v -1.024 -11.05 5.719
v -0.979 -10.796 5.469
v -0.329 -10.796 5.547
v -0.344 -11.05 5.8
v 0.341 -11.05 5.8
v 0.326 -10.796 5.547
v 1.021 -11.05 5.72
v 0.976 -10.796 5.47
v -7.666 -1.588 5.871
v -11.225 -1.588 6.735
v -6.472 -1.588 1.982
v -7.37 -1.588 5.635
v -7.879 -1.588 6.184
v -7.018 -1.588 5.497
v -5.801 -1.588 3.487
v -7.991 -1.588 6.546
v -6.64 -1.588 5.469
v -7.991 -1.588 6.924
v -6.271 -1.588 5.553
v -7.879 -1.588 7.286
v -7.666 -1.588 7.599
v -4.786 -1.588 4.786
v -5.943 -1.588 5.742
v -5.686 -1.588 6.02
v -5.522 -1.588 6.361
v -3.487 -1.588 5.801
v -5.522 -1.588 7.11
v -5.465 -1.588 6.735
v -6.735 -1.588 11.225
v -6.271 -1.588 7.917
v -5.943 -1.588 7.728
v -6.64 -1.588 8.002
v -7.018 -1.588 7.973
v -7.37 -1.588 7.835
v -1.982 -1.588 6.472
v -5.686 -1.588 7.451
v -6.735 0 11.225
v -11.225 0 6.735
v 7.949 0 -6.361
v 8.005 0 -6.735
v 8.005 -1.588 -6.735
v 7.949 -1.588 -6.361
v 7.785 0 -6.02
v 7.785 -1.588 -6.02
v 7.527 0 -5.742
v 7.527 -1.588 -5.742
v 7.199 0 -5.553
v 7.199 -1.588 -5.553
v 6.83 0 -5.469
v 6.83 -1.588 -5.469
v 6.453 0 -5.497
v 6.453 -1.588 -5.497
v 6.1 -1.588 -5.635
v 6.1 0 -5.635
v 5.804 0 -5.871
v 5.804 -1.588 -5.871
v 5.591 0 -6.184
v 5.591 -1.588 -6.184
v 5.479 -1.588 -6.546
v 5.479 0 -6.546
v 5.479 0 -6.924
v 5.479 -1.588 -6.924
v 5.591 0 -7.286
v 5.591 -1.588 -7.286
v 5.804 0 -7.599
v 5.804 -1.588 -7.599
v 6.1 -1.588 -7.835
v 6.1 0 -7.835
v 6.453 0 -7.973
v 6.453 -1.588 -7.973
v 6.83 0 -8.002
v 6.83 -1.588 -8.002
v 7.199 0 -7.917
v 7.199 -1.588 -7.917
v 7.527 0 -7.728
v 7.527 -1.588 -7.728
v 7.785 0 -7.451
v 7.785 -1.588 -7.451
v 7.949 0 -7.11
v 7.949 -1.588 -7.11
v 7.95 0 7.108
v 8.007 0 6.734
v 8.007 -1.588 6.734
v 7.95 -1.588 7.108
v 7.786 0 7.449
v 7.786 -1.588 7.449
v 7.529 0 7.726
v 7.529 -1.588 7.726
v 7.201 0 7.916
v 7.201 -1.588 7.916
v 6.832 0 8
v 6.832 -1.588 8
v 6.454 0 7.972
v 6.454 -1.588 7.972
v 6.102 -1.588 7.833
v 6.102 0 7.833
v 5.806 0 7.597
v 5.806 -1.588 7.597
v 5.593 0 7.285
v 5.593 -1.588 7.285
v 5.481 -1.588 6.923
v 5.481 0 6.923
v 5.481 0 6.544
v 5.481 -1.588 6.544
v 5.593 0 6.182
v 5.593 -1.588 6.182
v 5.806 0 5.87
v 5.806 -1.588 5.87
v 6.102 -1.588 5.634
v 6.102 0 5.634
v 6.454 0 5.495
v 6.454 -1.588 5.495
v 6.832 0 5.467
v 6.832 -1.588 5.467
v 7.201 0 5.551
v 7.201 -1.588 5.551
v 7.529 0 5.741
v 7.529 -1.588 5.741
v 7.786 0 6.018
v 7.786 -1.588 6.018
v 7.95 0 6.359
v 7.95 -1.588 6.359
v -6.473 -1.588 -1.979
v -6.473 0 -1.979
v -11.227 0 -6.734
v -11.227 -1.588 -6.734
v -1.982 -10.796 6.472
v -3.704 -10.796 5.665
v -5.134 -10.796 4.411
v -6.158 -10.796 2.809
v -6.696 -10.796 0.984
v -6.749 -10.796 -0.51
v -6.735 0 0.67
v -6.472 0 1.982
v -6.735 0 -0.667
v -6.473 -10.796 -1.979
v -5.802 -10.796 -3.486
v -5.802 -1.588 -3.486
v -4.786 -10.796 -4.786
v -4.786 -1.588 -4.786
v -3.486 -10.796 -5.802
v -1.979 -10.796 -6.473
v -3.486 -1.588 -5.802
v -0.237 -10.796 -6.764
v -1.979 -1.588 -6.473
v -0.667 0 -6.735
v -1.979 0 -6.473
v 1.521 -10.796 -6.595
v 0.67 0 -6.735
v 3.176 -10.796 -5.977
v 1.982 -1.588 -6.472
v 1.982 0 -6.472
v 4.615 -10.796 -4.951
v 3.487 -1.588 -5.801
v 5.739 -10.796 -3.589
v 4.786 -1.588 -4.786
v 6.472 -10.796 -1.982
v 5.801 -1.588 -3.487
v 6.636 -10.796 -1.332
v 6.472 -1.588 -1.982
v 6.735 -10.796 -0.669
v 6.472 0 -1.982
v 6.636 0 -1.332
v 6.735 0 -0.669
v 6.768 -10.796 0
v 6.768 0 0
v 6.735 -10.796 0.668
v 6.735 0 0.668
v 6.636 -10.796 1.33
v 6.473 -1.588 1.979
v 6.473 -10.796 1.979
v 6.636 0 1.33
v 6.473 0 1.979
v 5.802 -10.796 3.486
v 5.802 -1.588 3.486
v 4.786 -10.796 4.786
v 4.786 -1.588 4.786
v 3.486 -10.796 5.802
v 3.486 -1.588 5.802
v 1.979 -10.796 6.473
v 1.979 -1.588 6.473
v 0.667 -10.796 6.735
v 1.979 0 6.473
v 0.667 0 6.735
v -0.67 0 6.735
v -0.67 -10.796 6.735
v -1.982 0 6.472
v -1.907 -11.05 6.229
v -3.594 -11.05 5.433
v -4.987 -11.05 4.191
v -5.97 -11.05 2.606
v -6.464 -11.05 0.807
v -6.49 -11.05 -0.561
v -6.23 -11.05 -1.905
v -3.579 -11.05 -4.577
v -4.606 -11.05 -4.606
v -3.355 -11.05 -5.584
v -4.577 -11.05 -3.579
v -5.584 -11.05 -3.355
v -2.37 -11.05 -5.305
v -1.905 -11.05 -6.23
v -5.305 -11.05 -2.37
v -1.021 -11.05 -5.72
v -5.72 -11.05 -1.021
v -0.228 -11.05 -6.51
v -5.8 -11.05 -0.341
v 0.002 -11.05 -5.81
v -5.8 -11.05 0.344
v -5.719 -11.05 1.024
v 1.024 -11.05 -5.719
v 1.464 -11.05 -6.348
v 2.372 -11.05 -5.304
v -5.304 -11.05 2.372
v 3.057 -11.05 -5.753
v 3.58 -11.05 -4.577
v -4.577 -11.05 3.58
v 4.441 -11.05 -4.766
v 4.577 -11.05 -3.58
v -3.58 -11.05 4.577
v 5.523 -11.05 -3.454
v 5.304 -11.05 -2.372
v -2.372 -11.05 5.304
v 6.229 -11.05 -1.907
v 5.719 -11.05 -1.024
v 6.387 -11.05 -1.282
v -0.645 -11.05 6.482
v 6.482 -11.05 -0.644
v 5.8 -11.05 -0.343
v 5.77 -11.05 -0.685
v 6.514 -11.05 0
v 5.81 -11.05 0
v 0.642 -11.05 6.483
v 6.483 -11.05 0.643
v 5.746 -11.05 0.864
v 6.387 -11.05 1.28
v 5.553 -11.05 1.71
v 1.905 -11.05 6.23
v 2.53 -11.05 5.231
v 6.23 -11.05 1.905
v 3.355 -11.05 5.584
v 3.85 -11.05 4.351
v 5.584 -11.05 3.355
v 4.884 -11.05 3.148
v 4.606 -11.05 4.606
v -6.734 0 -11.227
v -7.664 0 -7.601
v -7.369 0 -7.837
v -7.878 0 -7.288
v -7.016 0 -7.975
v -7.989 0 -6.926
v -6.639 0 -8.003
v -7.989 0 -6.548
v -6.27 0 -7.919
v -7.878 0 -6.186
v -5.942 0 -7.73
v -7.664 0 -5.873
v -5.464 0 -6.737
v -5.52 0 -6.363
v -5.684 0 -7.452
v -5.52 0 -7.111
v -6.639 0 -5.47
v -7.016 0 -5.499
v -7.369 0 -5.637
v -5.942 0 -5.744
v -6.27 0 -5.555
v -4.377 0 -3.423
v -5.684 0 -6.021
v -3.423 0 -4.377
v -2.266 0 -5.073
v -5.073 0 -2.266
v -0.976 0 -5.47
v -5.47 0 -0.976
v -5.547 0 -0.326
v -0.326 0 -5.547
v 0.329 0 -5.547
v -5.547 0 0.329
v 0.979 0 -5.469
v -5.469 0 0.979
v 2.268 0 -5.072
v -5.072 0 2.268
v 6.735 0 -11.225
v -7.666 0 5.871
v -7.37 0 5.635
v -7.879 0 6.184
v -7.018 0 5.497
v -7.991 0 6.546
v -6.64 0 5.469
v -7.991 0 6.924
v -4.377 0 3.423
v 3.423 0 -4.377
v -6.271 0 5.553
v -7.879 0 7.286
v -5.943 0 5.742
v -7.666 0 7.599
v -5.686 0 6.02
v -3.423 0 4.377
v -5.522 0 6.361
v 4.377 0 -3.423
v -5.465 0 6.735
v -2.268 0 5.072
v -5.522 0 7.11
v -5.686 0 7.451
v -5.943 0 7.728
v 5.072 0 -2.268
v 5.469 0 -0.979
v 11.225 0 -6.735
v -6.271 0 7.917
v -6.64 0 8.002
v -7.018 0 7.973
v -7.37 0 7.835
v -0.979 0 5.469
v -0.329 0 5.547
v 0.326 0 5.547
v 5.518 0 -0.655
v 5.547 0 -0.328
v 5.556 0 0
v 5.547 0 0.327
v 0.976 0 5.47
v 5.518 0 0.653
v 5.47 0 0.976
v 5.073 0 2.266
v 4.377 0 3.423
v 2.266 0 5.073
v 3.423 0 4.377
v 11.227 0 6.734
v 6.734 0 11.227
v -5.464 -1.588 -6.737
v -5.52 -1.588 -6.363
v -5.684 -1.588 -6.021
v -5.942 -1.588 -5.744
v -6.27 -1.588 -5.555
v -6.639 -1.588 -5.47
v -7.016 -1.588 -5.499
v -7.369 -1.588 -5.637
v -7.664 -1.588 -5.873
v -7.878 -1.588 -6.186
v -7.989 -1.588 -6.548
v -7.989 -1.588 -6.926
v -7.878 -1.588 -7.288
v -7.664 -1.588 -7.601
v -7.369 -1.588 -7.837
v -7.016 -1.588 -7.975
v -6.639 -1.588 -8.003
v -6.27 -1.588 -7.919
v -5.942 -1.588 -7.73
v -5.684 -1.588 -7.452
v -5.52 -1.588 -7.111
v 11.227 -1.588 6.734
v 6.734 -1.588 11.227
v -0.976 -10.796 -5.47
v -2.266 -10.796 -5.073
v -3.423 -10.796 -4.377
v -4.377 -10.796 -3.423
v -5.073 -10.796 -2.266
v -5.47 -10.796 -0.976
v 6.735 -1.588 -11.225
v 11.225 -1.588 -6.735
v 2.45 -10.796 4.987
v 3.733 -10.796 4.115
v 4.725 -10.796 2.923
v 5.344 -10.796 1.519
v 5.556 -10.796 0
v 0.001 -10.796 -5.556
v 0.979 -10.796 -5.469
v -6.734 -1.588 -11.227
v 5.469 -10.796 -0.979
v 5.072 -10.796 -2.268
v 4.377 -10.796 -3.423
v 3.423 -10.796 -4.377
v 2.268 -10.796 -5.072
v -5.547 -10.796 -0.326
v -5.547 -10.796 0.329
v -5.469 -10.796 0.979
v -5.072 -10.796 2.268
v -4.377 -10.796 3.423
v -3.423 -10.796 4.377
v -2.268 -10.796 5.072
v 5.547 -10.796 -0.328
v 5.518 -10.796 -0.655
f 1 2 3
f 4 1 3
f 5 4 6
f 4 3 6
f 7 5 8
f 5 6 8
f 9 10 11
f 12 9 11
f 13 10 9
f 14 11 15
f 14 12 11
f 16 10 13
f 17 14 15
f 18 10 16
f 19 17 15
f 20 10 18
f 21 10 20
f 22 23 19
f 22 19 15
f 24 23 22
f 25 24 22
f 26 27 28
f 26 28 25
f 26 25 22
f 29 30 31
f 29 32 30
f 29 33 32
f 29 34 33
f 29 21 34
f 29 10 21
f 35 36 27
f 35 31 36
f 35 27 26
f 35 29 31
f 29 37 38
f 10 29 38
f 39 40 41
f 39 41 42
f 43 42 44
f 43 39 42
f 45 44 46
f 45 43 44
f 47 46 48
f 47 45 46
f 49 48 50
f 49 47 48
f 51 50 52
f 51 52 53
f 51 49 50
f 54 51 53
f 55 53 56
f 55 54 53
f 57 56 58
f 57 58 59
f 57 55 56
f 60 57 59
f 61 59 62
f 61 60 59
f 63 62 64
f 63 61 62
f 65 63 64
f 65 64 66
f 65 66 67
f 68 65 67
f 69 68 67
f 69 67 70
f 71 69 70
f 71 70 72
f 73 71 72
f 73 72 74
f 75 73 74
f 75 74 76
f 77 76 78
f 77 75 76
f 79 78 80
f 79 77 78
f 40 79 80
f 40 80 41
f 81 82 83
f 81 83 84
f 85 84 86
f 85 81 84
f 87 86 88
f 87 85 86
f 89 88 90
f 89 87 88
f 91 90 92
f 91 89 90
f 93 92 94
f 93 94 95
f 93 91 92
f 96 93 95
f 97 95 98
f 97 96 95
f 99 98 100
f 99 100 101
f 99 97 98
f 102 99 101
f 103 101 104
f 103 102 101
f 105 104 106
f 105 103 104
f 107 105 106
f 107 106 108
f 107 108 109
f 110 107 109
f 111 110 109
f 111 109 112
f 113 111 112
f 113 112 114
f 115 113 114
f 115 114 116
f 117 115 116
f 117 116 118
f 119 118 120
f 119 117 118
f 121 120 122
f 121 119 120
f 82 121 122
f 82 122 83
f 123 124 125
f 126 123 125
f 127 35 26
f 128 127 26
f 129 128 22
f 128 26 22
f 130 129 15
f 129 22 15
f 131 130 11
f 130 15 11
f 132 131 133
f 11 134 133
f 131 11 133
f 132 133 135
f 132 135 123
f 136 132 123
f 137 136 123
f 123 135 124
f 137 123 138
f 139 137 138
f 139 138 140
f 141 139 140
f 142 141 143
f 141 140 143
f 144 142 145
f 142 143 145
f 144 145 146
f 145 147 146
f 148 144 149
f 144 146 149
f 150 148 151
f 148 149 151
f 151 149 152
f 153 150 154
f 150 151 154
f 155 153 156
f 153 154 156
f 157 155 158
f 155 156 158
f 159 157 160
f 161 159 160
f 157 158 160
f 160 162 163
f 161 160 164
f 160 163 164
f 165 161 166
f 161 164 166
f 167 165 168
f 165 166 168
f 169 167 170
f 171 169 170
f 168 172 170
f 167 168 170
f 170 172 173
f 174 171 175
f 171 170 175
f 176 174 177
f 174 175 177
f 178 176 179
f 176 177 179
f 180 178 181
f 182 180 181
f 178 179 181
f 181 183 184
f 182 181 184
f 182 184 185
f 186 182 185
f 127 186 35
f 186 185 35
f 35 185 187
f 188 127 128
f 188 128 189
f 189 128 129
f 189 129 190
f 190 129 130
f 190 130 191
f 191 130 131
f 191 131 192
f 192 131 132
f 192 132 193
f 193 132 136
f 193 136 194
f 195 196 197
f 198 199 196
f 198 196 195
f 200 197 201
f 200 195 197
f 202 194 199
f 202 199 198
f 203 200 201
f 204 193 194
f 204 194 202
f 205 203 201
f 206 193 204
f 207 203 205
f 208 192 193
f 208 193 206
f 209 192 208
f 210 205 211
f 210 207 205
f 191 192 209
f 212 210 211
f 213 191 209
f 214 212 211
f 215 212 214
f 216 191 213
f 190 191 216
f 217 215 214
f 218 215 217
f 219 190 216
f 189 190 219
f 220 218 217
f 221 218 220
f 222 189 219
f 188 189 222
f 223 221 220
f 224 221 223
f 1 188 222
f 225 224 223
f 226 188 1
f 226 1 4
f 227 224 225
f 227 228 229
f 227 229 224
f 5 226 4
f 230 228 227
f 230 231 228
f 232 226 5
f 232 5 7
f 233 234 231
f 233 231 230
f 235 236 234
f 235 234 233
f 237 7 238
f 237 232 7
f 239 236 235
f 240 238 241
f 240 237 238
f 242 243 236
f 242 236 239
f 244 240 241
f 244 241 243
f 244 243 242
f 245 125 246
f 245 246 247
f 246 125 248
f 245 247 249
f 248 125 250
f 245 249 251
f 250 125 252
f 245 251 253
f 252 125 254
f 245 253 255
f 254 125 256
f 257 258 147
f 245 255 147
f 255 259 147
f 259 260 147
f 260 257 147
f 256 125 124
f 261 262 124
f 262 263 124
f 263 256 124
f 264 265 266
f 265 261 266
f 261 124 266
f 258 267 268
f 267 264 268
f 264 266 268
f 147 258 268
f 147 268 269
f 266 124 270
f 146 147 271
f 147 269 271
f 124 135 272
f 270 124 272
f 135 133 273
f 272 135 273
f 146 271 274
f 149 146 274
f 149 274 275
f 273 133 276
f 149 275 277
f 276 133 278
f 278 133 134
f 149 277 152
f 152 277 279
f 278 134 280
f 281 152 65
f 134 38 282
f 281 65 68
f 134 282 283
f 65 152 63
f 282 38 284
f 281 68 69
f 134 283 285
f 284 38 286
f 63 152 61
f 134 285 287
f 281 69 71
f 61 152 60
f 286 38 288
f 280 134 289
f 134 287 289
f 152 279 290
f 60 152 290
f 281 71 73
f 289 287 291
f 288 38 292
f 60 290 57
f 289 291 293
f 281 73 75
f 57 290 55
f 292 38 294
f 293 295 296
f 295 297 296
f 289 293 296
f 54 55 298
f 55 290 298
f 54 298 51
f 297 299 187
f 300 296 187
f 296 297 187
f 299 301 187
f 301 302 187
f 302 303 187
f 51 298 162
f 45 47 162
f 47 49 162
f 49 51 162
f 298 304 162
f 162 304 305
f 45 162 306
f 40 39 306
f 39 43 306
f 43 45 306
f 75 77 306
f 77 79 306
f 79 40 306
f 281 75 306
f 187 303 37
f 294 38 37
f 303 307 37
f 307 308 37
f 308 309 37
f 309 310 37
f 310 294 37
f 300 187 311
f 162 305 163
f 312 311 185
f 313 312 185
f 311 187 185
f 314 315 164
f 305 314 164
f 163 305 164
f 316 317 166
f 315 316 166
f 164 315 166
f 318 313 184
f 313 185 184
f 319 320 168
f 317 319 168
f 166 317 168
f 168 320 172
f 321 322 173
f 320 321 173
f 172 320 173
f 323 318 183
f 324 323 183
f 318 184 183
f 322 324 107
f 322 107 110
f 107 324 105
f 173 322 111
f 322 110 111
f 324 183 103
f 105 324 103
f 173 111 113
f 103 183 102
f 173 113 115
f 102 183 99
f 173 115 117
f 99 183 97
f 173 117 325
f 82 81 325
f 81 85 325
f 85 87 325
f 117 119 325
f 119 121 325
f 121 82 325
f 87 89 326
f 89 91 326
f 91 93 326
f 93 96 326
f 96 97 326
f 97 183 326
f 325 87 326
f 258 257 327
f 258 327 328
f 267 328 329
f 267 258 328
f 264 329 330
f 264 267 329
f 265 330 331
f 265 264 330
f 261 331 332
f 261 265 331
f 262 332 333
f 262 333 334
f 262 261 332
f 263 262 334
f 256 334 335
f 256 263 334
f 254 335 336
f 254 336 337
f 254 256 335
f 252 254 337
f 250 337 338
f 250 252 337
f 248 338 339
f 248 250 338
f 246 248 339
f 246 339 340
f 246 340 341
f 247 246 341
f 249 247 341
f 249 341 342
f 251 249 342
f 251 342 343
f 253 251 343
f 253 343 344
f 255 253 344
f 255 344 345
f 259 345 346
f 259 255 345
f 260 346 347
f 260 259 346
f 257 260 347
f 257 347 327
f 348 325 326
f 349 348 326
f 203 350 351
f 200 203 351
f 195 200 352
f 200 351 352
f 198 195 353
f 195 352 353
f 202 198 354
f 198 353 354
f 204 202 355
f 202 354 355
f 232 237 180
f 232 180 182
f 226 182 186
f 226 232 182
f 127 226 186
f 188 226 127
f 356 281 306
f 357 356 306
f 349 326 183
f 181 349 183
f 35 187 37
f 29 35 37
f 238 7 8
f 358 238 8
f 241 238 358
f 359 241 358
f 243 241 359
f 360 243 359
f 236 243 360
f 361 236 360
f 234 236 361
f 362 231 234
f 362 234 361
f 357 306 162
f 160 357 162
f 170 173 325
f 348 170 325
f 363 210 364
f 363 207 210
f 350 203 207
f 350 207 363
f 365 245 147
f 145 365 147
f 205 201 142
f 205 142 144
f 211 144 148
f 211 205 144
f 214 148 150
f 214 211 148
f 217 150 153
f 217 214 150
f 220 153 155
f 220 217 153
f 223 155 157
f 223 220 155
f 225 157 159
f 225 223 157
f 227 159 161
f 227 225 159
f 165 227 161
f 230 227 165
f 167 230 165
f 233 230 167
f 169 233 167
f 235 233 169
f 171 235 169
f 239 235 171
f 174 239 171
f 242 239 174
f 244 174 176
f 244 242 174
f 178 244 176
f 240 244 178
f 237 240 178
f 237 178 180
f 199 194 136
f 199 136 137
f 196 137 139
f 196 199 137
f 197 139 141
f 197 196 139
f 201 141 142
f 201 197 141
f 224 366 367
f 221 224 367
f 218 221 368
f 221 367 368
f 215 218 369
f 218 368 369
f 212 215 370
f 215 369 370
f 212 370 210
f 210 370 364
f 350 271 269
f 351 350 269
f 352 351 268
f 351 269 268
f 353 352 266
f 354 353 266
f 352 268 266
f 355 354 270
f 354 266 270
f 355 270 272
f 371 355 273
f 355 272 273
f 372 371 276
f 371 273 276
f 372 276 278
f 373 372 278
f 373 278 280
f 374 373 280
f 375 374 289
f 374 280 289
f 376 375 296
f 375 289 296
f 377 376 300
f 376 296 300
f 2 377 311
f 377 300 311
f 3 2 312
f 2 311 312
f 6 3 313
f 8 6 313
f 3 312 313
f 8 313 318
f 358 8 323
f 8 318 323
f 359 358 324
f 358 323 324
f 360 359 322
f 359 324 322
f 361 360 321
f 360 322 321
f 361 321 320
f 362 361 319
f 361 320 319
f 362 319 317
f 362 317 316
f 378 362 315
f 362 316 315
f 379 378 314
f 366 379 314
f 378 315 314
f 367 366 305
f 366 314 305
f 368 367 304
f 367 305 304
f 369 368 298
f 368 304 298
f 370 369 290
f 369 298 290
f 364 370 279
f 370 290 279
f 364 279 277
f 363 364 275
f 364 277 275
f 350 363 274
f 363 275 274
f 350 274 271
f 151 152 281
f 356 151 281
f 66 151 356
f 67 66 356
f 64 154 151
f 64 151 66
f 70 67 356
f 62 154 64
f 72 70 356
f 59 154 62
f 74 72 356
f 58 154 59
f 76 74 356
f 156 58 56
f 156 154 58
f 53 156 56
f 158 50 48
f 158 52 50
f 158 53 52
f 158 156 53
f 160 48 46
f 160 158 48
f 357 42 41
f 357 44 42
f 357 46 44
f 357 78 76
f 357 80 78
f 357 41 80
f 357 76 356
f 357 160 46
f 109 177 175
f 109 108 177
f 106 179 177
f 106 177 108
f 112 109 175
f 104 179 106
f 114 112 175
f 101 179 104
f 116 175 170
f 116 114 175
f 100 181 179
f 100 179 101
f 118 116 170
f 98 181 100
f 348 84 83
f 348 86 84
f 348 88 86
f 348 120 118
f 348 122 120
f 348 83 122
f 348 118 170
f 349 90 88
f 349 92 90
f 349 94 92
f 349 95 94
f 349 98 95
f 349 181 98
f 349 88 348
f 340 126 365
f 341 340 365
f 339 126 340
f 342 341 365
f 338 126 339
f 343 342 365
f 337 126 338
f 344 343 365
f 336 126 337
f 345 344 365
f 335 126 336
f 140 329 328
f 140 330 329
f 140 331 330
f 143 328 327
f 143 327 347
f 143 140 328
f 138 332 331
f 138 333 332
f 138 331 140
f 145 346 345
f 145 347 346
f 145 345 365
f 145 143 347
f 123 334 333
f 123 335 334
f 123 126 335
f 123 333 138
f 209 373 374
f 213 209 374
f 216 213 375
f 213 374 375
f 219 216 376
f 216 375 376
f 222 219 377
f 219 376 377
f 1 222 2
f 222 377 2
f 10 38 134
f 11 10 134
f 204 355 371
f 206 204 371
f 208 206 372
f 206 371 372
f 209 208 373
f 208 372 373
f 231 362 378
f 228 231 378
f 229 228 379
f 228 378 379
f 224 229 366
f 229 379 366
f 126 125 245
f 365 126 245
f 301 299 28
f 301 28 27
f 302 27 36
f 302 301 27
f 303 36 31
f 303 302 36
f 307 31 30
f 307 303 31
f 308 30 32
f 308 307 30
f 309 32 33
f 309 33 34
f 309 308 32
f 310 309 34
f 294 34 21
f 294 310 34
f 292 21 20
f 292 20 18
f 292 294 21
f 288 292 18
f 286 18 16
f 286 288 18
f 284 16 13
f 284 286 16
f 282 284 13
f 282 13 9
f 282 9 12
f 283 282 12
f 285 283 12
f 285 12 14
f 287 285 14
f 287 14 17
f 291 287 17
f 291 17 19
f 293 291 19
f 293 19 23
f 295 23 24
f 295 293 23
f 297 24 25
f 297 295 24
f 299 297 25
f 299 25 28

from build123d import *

# Parameters (mm, degrees)
F0_R     = 1.27
F1_DEPTH = 1.5875
F2_DEPTH = 11.0500585288
F3_SIZE  = 0.254


with BuildPart() as f1:
    # F0 (on Front) → F1 (new body)
    with BuildSketch(Plane.XZ):
        with BuildLine():
            Line((-6.7335235308, -11.2269887114), (-1.9790852934, -6.4725504739))
            ThreePointArc((-1.9790852934, -6.4725504739), (-4.785952791, -4.785952791), (-6.4725504739, -1.9790852934))
            Line((-6.4725504739, -1.9790852934), (-11.2269887114, -6.7335235308))
            Line((-11.2269887114, -6.7335235308), (-6.7335235308, -11.2269887114))
        make_face()
        with Locations((-6.7335235308, -6.7368606508)):
            Circle(F0_R, mode=Mode.SUBTRACT)
        with BuildLine():
            Line((6.7351920908, -11.2253201513), (11.2253201513, -6.7351920908))
            Line((11.2253201513, -6.7351920908), (6.4717686116, -1.9816405511))
            ThreePointArc((6.4717686116, -1.9816405511), (4.785952791, -4.785952791), (1.9816405511, -6.4717686116))
            Line((1.9816405511, -6.4717686116), (6.7351920908, -11.2253201513))
        make_face()
        with Locations((6.7351920908, -6.7351920908)):
            Circle(F0_R, mode=Mode.SUBTRACT)
        with BuildLine():
            Line((-11.2253201513, 6.7351920908), (-6.4717686116, 1.9816405511))
            ThreePointArc((-6.4717686116, 1.9816405511), (-4.785952791, 4.785952791), (-1.9816405511, 6.4717686116))
            Line((-1.9816405511, 6.4717686116), (-6.7351920908, 11.2253201513))
            Line((-6.7351920908, 11.2253201513), (-11.2253201513, 6.7351920908))
        make_face()
        with Locations((-6.7351920908, 6.7351920908)):
            Circle(F0_R, mode=Mode.SUBTRACT)
        with BuildLine():
            ThreePointArc((1.9790852934, 6.4725504739), (4.785952791, 4.785952791), (6.4725504739, 1.9790852934))
            Line((6.4725504739, 1.9790852934), (11.2269887114, 6.7335235308))
            Line((11.2269887114, 6.7335235308), (6.7335235308, 11.2269887114))
            Line((6.7335235308, 11.2269887114), (1.9790852934, 6.4725504739))
        make_face()
        with Locations((6.7368606508, 6.7335235308)):
            Circle(F0_R, mode=Mode.SUBTRACT)
        with BuildLine():
            ThreePointArc((-1.9790852934, -6.4725504739), (0.0013360998, -6.7683592141), (1.9816405511, -6.4717686116))
            Line((1.9816405511, -6.4717686116), (0.9791637116, -5.4692917721))
            ThreePointArc((0.9791637116, -5.4692917721), (0.001437958, -5.5562498139), (-0.9763326742, -5.4697978547))
            Line((-0.9763326742, -5.4697978547), (-1.9790852934, -6.4725504739))
        make_face()
        with BuildLine():
            ThreePointArc((1.9816405511, -6.4717686116), (4.785952791, -4.785952791), (6.4717686116, -1.9816405511))
            Line((6.4717686116, -1.9816405511), (5.4692917721, -0.9791637116))
            ThreePointArc((5.4692917721, -0.9791637116), (3.928862053, -3.928862053), (0.9791637116, -5.4692917721))
            Line((0.9791637116, -5.4692917721), (1.9816405511, -6.4717686116))
        make_face()
        with BuildLine():
            ThreePointArc((-6.4725504739, -1.9790852934), (-4.785952791, -4.785952791), (-1.9790852934, -6.4725504739))
            Line((-1.9790852934, -6.4725504739), (-0.9763326742, -5.4697978547))
            ThreePointArc((-0.9763326742, -5.4697978547), (-3.928862053, -3.928862053), (-5.4697978547, -0.9763326742))
            Line((-5.4697978547, -0.9763326742), (-6.4725504739, -1.9790852934))
        make_face()
        with BuildLine():
            Line((5.4692917721, -0.9791637116), (6.4717686116, -1.9816405511))
            ThreePointArc((6.4717686116, -1.9816405511), (6.6938010055, -1.001856444), (6.7683593459, 0))
            ThreePointArc((6.7683593459, 0), (6.6939986454, 1.0005350428), (6.4725504739, 1.9790852934))
            Line((6.4725504739, 1.9790852934), (5.4697978547, 0.9763326742))
            ThreePointArc((5.4697978547, 0.9763326742), (5.5345947635, 0.4900763879), (5.55625, 0))
            ThreePointArc((5.55625, 0), (5.5344677464, -0.4915087251), (5.4692917721, -0.9791637116))
        make_face()
        with BuildLine():
            Line((5.4697978547, 0.9763326742), (6.4725504739, 1.9790852934))
            ThreePointArc((6.4725504739, 1.9790852934), (4.785952791, 4.785952791), (1.9790852934, 6.4725504739))
            Line((1.9790852934, 6.4725504739), (0.9763326742, 5.4697978547))
            ThreePointArc((0.9763326742, 5.4697978547), (3.928862053, 3.928862053), (5.4697978547, 0.9763326742))
        make_face()
        with BuildLine():
            Line((0.9763326742, 5.4697978547), (1.9790852934, 6.4725504739))
            ThreePointArc((1.9790852934, 6.4725504739), (-0.0013360998, 6.7683592141), (-1.9816405511, 6.4717686116))
            Line((-1.9816405511, 6.4717686116), (-0.9791637116, 5.4692917721))
            ThreePointArc((-0.9791637116, 5.4692917721), (-0.001437958, 5.5562498139), (0.9763326742, 5.4697978547))
        make_face()
        with BuildLine():
            ThreePointArc((-6.4717686116, 1.9816405511), (-6.7683592141, 0.0013360998), (-6.4725504739, -1.9790852934))
            Line((-6.4725504739, -1.9790852934), (-5.4697978547, -0.9763326742))
            ThreePointArc((-5.4697978547, -0.9763326742), (-5.5562498139, 0.001437958), (-5.4692917721, 0.9791637116))
            Line((-5.4692917721, 0.9791637116), (-6.4717686116, 1.9816405511))
        make_face()
        with BuildLine():
            ThreePointArc((-5.4692917721, 0.9791637116), (-3.928862053, 3.928862053), (-0.9791637116, 5.4692917721))
            Line((-0.9791637116, 5.4692917721), (-1.9816405511, 6.4717686116))
            ThreePointArc((-1.9816405511, 6.4717686116), (-4.785952791, 4.785952791), (-6.4717686116, 1.9816405511))
            Line((-6.4717686116, 1.9816405511), (-5.4692917721, 0.9791637116))
        make_face()
    extrude(amount=F1_DEPTH)

    # F0 (on Front) → F2 (join)
    with BuildSketch(Plane.XZ):
        with BuildLine():
            Line((5.4697978547, 0.9763326742), (6.4725504739, 1.9790852934))
            ThreePointArc((6.4725504739, 1.9790852934), (4.785952791, 4.785952791), (1.9790852934, 6.4725504739))
            Line((1.9790852934, 6.4725504739), (0.9763326742, 5.4697978547))
            ThreePointArc((0.9763326742, 5.4697978547), (3.928862053, 3.928862053), (5.4697978547, 0.9763326742))
        make_face()
        with BuildLine():
            Line((5.4692917721, -0.9791637116), (6.4717686116, -1.9816405511))
            ThreePointArc((6.4717686116, -1.9816405511), (6.6938010055, -1.001856444), (6.7683593459, 0))
            ThreePointArc((6.7683593459, 0), (6.6939986454, 1.0005350428), (6.4725504739, 1.9790852934))
            Line((6.4725504739, 1.9790852934), (5.4697978547, 0.9763326742))
            ThreePointArc((5.4697978547, 0.9763326742), (5.5345947635, 0.4900763879), (5.55625, 0))
            ThreePointArc((5.55625, 0), (5.5344677464, -0.4915087251), (5.4692917721, -0.9791637116))
        make_face()
        with BuildLine():
            ThreePointArc((1.9816405511, -6.4717686116), (4.785952791, -4.785952791), (6.4717686116, -1.9816405511))
            Line((6.4717686116, -1.9816405511), (5.4692917721, -0.9791637116))
            ThreePointArc((5.4692917721, -0.9791637116), (3.928862053, -3.928862053), (0.9791637116, -5.4692917721))
            Line((0.9791637116, -5.4692917721), (1.9816405511, -6.4717686116))
        make_face()
        with BuildLine():
            ThreePointArc((-1.9790852934, -6.4725504739), (0.0013360998, -6.7683592141), (1.9816405511, -6.4717686116))
            Line((1.9816405511, -6.4717686116), (0.9791637116, -5.4692917721))
            ThreePointArc((0.9791637116, -5.4692917721), (0.001437958, -5.5562498139), (-0.9763326742, -5.4697978547))
            Line((-0.9763326742, -5.4697978547), (-1.9790852934, -6.4725504739))
        make_face()
        with BuildLine():
            ThreePointArc((-6.4725504739, -1.9790852934), (-4.785952791, -4.785952791), (-1.9790852934, -6.4725504739))
            Line((-1.9790852934, -6.4725504739), (-0.9763326742, -5.4697978547))
            ThreePointArc((-0.9763326742, -5.4697978547), (-3.928862053, -3.928862053), (-5.4697978547, -0.9763326742))
            Line((-5.4697978547, -0.9763326742), (-6.4725504739, -1.9790852934))
        make_face()
        with BuildLine():
            ThreePointArc((-6.4717686116, 1.9816405511), (-6.7683592141, 0.0013360998), (-6.4725504739, -1.9790852934))
            Line((-6.4725504739, -1.9790852934), (-5.4697978547, -0.9763326742))
            ThreePointArc((-5.4697978547, -0.9763326742), (-5.5562498139, 0.001437958), (-5.4692917721, 0.9791637116))
            Line((-5.4692917721, 0.9791637116), (-6.4717686116, 1.9816405511))
        make_face()
        with BuildLine():
            ThreePointArc((-5.4692917721, 0.9791637116), (-3.928862053, 3.928862053), (-0.9791637116, 5.4692917721))
            Line((-0.9791637116, 5.4692917721), (-1.9816405511, 6.4717686116))
            ThreePointArc((-1.9816405511, 6.4717686116), (-4.785952791, 4.785952791), (-6.4717686116, 1.9816405511))
            Line((-6.4717686116, 1.9816405511), (-5.4692917721, 0.9791637116))
        make_face()
        with BuildLine():
            Line((0.9763326742, 5.4697978547), (1.9790852934, 6.4725504739))
            ThreePointArc((1.9790852934, 6.4725504739), (-0.0013360998, 6.7683592141), (-1.9816405511, 6.4717686116))
            Line((-1.9816405511, 6.4717686116), (-0.9791637116, 5.4692917721))
            ThreePointArc((-0.9791637116, 5.4692917721), (-0.001437958, 5.5562498139), (0.9763326742, 5.4697978547))
        make_face()
    extrude(amount=F2_DEPTH)

    # F3
    f3_edges = [f1.edges().sort_by_distance(p)[0] for p in [
        (-1.979085, -11.050059, -6.47255),
        (0.979164, -11.050059, -5.469292),
    ]]
    chamfer(f3_edges, length=F3_SIZE)


solid = f1.part
